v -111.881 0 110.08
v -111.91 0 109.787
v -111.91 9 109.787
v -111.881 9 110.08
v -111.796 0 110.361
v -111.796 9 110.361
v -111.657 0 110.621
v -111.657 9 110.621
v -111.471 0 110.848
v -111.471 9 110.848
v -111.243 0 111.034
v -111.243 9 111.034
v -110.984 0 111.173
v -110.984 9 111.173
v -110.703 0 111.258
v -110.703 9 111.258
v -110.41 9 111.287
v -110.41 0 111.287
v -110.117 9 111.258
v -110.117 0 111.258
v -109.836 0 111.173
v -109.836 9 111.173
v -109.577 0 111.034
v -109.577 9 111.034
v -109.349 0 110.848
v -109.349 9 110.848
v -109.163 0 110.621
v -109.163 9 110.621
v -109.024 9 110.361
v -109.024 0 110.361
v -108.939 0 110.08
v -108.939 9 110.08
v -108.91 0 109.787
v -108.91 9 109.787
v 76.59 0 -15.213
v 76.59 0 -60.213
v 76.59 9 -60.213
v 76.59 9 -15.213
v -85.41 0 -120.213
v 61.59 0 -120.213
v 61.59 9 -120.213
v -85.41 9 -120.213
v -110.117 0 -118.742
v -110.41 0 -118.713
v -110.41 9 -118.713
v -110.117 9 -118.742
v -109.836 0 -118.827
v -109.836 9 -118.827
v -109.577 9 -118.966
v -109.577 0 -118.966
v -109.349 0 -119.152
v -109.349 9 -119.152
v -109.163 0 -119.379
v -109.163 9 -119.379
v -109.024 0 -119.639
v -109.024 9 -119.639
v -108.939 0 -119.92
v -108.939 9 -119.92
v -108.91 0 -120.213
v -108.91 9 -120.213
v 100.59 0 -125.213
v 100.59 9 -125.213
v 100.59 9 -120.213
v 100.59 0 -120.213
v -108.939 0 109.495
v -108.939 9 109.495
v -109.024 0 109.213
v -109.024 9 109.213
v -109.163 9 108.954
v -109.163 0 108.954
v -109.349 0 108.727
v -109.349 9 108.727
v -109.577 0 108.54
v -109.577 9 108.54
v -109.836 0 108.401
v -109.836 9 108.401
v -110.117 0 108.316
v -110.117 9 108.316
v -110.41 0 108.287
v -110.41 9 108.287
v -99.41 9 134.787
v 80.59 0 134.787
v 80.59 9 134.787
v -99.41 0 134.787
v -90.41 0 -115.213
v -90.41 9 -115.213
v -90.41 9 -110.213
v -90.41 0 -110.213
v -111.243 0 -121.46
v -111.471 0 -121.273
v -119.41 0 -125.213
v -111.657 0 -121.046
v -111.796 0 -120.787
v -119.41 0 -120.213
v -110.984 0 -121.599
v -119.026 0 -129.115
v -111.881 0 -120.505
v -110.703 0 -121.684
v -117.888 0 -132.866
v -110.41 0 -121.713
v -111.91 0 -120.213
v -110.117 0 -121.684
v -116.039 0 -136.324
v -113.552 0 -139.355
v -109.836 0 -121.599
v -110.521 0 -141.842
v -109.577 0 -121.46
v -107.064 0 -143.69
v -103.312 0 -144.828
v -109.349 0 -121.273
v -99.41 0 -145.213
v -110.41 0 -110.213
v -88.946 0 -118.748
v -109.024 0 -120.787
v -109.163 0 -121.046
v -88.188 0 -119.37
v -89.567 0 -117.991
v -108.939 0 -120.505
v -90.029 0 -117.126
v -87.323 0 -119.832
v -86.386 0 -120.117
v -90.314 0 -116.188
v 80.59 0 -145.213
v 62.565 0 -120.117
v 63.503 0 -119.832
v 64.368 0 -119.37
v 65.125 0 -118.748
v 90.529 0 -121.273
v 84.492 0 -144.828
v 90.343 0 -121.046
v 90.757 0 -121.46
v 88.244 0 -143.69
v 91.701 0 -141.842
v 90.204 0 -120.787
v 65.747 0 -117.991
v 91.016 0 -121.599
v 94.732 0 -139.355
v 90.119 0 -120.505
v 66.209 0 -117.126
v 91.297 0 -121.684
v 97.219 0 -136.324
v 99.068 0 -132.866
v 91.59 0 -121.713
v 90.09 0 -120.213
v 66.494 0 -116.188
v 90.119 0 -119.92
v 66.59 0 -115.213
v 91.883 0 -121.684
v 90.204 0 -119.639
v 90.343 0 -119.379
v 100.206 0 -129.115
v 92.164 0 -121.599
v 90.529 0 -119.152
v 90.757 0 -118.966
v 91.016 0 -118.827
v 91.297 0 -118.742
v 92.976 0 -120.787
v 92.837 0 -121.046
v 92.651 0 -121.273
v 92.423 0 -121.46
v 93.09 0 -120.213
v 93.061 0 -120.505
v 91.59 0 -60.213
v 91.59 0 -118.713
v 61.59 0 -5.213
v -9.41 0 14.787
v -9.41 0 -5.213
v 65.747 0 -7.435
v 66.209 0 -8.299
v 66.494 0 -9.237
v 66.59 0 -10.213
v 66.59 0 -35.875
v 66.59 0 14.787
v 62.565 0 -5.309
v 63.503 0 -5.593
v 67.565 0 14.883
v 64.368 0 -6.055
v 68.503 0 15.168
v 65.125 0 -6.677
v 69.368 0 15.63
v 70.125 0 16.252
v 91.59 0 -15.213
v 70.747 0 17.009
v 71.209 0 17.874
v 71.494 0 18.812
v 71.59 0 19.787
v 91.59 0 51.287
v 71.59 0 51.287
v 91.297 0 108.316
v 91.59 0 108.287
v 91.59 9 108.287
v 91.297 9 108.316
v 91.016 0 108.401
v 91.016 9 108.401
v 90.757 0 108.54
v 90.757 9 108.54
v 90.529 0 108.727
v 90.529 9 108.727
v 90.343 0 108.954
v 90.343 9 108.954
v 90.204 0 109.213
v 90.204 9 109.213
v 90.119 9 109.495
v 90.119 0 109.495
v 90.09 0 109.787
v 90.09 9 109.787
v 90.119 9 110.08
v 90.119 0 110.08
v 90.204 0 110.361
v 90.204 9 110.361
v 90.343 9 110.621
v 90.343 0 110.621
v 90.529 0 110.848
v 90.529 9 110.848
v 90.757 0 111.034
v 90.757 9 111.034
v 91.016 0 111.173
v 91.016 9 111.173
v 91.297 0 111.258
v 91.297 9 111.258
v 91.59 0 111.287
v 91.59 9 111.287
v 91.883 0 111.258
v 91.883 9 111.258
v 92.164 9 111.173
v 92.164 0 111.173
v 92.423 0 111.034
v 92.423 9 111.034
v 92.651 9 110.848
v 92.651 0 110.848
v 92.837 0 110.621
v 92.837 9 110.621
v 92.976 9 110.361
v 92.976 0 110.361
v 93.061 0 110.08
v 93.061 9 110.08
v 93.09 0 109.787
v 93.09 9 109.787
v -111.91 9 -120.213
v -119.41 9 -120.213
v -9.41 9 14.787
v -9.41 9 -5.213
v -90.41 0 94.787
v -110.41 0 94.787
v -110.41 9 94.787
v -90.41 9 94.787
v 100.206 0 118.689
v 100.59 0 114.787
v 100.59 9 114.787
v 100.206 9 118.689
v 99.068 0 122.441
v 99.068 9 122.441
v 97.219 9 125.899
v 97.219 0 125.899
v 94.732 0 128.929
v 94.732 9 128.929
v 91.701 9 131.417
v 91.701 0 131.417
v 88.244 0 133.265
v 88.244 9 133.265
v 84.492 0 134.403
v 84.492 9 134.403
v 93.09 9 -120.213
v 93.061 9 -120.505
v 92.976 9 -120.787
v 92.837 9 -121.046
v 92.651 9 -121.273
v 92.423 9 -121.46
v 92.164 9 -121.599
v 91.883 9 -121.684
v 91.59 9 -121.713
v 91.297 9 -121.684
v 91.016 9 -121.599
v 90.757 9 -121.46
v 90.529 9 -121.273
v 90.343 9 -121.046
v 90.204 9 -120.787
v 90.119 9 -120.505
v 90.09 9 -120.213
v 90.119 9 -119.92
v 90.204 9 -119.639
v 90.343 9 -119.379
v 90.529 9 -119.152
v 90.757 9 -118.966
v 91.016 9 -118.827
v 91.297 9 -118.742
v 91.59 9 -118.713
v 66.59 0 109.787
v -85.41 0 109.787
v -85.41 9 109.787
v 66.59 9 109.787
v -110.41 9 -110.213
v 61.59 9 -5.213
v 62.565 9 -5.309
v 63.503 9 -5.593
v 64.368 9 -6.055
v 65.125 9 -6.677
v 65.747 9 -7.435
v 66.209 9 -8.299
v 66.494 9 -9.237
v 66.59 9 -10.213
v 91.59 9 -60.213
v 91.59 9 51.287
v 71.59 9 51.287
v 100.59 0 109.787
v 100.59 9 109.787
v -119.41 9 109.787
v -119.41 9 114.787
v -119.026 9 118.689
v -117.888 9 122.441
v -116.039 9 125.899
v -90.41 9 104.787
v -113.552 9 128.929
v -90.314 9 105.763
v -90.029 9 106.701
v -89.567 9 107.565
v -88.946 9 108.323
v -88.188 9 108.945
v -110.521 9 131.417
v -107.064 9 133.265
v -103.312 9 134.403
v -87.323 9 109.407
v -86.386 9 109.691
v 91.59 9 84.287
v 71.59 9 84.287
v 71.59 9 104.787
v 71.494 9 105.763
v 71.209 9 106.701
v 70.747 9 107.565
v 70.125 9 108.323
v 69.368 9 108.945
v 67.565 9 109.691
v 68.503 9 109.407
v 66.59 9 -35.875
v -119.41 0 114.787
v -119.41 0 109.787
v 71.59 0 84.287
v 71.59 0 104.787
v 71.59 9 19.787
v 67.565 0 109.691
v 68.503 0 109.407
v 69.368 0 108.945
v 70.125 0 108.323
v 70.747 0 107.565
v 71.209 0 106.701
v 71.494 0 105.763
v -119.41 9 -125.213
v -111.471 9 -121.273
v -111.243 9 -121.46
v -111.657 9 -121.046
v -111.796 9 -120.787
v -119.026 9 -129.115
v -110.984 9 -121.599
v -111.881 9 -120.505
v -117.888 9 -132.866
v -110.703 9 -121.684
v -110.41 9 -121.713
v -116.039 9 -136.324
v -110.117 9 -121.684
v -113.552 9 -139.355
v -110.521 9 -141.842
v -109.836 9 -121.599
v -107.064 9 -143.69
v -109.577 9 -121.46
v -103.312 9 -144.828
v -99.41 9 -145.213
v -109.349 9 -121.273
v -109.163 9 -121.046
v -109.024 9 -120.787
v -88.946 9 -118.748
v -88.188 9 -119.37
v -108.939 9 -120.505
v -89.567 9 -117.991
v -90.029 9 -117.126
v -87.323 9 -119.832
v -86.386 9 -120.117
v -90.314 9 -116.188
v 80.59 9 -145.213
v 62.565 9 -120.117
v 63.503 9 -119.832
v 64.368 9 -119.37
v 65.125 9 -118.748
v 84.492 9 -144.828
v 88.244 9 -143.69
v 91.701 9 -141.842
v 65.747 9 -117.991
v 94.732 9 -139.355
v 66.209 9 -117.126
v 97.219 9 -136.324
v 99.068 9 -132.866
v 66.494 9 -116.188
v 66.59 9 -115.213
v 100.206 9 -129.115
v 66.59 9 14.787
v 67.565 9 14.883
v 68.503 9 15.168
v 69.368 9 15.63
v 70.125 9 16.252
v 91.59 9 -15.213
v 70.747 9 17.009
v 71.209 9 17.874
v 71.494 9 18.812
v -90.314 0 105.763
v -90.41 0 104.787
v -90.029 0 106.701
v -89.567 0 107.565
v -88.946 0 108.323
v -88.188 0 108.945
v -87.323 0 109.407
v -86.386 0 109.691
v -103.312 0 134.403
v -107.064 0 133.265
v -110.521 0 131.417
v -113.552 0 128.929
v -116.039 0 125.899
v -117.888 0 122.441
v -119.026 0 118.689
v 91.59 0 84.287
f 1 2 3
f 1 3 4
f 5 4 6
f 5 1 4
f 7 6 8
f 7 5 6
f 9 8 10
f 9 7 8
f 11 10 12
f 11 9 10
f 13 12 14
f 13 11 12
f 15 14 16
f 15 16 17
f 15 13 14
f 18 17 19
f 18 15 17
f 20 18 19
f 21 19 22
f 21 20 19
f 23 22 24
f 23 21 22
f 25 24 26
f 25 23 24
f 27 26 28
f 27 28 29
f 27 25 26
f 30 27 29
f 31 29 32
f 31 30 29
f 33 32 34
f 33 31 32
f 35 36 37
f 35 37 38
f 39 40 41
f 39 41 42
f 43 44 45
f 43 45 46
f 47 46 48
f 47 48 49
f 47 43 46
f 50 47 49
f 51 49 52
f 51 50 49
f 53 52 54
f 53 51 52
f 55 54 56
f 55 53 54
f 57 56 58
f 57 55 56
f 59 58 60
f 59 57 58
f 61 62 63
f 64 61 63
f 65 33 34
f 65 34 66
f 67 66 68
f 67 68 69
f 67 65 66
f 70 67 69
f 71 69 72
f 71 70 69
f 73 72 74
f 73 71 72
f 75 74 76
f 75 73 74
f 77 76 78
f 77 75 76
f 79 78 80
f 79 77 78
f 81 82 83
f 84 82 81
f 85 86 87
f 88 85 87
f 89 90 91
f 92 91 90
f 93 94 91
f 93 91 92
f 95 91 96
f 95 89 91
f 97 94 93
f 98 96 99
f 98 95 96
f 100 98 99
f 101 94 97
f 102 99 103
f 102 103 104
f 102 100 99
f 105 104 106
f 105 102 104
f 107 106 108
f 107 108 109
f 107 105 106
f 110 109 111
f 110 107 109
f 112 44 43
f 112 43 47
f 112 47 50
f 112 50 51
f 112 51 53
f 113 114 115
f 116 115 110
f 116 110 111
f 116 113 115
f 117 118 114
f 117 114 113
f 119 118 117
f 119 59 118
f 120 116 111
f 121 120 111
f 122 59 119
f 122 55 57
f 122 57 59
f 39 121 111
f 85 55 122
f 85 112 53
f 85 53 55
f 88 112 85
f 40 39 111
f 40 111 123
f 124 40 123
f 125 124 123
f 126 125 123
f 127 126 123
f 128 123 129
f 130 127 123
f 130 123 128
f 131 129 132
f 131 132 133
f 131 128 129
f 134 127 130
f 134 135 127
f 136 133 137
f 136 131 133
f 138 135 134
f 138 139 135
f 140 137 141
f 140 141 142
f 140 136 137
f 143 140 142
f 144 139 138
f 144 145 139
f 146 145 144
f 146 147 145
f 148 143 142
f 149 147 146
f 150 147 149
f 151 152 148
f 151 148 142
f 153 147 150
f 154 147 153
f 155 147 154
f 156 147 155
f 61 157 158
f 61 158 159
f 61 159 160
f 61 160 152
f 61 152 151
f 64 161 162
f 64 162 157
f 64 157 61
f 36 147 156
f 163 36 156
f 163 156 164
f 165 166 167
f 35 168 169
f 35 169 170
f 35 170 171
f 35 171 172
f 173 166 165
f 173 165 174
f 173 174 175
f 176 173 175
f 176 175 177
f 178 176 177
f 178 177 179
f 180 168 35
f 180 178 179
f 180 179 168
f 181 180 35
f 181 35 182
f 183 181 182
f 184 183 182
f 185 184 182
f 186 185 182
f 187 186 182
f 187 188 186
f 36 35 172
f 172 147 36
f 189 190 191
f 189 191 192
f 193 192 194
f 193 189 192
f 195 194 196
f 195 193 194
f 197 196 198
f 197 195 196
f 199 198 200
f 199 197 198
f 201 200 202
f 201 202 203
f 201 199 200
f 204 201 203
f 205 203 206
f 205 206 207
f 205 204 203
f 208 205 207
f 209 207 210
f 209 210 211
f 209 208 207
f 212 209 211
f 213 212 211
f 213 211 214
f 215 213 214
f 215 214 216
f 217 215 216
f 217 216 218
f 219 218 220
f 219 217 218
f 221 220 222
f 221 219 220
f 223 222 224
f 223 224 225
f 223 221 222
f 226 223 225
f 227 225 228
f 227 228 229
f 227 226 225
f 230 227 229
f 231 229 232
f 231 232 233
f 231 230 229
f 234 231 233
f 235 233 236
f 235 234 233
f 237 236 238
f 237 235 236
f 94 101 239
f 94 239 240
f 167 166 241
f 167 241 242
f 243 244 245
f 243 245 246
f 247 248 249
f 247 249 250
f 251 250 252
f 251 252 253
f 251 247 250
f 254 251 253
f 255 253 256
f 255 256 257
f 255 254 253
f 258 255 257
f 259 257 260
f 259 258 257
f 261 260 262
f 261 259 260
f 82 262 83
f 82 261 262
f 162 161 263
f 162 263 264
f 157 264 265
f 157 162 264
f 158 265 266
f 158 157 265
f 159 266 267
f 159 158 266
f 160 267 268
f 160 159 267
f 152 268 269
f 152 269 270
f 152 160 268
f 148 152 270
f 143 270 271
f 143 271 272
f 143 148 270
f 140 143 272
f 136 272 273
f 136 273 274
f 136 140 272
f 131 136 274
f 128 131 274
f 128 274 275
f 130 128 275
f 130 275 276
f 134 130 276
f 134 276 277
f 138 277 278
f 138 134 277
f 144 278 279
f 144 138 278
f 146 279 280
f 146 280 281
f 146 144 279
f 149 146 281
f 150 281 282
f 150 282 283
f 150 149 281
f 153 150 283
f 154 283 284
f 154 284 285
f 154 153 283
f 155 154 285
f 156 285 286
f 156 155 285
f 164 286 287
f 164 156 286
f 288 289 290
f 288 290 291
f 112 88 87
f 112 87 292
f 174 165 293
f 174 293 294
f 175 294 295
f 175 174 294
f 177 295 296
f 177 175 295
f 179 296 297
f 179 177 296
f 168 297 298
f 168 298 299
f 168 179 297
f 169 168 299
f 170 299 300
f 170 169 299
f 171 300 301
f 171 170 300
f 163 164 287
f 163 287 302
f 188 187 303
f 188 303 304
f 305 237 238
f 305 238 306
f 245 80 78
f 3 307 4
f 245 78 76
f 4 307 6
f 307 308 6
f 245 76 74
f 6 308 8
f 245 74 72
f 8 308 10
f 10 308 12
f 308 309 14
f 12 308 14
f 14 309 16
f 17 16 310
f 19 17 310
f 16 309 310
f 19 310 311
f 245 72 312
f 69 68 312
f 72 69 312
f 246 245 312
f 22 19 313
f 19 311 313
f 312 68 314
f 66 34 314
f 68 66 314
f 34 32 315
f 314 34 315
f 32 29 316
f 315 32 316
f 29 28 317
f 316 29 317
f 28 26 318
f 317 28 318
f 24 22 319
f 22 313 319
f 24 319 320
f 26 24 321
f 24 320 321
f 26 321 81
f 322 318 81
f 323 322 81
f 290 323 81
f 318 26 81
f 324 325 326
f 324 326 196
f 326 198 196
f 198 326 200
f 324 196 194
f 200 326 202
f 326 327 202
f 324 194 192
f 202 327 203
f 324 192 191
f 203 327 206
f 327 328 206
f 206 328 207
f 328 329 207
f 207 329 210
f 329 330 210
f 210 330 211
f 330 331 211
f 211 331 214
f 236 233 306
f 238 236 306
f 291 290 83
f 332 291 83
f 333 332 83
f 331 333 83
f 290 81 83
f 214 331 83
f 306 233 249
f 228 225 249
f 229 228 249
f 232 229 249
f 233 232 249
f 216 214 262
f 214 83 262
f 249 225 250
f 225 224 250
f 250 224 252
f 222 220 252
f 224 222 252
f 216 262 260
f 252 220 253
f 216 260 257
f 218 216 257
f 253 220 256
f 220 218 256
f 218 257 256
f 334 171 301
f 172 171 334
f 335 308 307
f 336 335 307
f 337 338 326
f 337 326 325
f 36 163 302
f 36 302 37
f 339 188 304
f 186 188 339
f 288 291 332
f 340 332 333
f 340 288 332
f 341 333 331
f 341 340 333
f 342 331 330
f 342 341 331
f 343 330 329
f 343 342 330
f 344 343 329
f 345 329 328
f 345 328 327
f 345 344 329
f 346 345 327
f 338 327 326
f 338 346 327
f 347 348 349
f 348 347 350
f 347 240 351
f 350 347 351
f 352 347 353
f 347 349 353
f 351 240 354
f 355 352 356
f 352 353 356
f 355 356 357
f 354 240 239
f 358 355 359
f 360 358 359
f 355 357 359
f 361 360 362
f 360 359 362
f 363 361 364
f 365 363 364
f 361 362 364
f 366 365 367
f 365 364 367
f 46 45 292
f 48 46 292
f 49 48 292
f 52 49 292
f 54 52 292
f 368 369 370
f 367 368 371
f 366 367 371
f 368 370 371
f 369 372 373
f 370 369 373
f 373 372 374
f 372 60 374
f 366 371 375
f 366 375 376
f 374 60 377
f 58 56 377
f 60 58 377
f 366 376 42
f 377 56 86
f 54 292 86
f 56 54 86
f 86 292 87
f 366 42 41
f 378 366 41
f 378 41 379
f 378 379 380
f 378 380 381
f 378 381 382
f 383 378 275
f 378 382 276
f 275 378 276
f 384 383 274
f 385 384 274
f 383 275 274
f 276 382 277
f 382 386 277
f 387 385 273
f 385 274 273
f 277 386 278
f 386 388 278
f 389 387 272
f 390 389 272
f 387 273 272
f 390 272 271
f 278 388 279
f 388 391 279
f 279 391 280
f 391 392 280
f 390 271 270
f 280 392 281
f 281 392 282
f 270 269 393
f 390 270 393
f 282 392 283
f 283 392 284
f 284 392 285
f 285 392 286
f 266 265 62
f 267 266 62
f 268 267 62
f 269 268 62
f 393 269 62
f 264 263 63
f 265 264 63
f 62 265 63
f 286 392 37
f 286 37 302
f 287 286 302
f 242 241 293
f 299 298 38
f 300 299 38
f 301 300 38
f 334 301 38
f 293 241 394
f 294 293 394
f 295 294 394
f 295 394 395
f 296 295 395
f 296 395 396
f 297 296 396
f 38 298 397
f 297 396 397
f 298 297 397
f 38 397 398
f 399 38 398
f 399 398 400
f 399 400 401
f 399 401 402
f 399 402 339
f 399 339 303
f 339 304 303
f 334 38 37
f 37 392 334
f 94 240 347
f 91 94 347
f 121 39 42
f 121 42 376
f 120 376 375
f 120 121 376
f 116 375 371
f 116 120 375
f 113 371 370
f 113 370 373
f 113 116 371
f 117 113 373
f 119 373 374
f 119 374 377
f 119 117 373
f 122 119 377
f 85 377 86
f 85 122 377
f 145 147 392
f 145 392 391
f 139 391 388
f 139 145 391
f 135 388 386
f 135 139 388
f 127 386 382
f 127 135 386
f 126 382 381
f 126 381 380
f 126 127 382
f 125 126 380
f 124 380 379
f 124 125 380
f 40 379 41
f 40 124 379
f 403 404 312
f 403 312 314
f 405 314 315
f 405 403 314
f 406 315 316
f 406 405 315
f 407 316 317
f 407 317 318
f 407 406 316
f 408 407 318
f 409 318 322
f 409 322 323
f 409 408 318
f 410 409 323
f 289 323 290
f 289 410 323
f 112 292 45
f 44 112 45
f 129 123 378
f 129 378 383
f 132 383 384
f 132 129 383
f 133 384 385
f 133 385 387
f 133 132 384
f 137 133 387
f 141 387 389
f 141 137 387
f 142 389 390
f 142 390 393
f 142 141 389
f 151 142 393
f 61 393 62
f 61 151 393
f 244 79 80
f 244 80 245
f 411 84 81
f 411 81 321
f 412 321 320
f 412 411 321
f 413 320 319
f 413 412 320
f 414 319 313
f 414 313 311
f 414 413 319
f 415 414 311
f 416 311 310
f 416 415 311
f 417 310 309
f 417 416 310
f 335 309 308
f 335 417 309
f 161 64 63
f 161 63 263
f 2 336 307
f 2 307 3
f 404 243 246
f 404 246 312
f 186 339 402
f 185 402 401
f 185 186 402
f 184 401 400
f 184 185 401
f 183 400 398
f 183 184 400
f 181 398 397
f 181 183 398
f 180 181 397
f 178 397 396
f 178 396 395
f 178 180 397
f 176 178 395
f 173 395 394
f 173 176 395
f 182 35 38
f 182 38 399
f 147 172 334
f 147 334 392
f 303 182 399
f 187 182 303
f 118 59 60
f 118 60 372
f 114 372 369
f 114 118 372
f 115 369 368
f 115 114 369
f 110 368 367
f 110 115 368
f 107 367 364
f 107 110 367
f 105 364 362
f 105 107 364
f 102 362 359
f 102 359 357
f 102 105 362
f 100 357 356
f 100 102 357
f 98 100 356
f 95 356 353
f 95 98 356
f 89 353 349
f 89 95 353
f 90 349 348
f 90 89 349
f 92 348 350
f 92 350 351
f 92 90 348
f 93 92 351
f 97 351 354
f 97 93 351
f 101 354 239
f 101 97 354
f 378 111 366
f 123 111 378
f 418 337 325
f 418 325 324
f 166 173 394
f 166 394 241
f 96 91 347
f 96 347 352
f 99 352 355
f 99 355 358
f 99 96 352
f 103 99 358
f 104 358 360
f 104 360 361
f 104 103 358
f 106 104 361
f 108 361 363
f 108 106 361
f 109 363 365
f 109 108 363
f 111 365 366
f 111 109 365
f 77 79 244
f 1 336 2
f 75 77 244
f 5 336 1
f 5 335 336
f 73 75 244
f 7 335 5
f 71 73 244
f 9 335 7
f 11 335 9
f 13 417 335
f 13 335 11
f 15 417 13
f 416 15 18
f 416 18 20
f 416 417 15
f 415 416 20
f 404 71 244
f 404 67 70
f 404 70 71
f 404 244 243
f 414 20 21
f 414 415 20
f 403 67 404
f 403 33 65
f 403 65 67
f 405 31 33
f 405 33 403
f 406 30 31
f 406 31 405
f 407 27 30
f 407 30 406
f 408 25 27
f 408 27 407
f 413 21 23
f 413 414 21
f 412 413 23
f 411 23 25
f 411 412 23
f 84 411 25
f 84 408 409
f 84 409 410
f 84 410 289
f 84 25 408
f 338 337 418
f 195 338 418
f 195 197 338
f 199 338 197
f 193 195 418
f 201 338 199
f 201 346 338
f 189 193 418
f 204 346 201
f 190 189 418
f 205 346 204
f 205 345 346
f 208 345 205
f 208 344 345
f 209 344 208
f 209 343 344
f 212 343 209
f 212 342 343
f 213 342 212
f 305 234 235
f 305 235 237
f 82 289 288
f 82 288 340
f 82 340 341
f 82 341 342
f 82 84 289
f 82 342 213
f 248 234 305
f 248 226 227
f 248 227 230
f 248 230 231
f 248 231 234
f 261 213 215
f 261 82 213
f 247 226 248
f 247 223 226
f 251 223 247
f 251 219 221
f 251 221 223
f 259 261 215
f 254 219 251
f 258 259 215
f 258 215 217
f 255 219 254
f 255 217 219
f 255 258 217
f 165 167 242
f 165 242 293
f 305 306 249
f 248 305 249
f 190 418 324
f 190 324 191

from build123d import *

# Parameters (mm, degrees)
F1_DEPTH = 9


with BuildPart() as f1:
    # F0 (on Front) → F1 (new body)
    with BuildSketch(Plane.XZ):
        with BuildLine():
            Line((80.58994, 134.787209), (-99.41006, 134.787209))
            ThreePointArc((-99.41006, 134.787209), (-113.552195, 128.929344), (-119.41006, 114.787209))
            Line((-119.41006, 114.787209), (-119.41006, 109.787209))
            Line((-119.41006, 109.787209), (-111.91006, 109.787209))
            ThreePointArc((-111.91006, 109.787209), (-110.41006, 111.287209), (-108.91006, 109.787209))
            ThreePointArc((-108.91006, 109.787209), (-109.349399, 108.726549), (-110.41006, 108.287209))
            Line((-110.41006, 108.287209), (-110.41006, 94.787209))
            Line((-110.41006, 94.787209), (-90.41006, 94.787209))
            Line((-90.41006, 94.787209), (-90.41006, 104.787209))
            ThreePointArc((-90.41006, 104.787209), (-88.945593, 108.322743), (-85.41006, 109.787209))
            Line((-85.41006, 109.787209), (66.589941, 109.787209))
            ThreePointArc((66.589941, 109.787209), (70.125475, 108.322743), (71.589941, 104.787209))
            Line((71.589941, 104.787209), (71.589941, 84.287209))
            Line((71.589941, 84.287209), (91.58994, 84.287209))
            Line((91.58994, 84.287209), (91.58994, 108.287209))
            ThreePointArc((91.58994, 108.287209), (90.52928, 110.847869), (93.08994, 109.787209))
            Line((93.08994, 109.787209), (100.58994, 109.787209))
            Line((100.58994, 109.787209), (100.58994, 114.787209))
            ThreePointArc((100.58994, 114.787209), (94.732076, 128.929344), (80.58994, 134.787209))
        make_face()
        with BuildLine():
            ThreePointArc((-119.41006, -125.212791), (-113.552195, -139.354927), (-99.41006, -145.212791))
            Line((-99.41006, -145.212791), (80.58994, -145.212791))
            ThreePointArc((80.58994, -145.212791), (94.732076, -139.354927), (100.58994, -125.212791))
            Line((100.58994, -125.212791), (100.58994, -120.212791))
            Line((100.58994, -120.212791), (93.08994, -120.212791))
            ThreePointArc((93.08994, -120.212791), (90.52928, -121.273451), (91.58994, -118.712791))
            Line((91.58994, -118.712791), (91.58994, -110.212791))
            Line((91.58994, -110.212791), (91.58994, -60.212791))
            Line((91.58994, -60.212791), (76.58994, -60.212791))
            Line((76.58994, -60.212791), (76.58994, -15.212791))
            Line((76.58994, -15.212791), (91.58994, -15.212791))
            Line((91.58994, -15.212791), (91.58994, 51.287209))
            Line((91.58994, 51.287209), (71.589941, 51.287209))
            Line((71.589941, 51.287209), (71.589941, 19.787209))
            ThreePointArc((71.589941, 19.787209), (70.125475, 16.251675), (66.589941, 14.787209))
            Line((66.589941, 14.787209), (-9.410059, 14.787209))
            Line((-9.410059, 14.787209), (-9.41006, -5.212791))
            Line((-9.41006, -5.212791), (61.589941, -5.212791))
            ThreePointArc((61.589941, -5.212791), (65.125475, -6.677257), (66.589941, -10.212791))
            Line((66.589941, -10.212791), (66.58994, -35.874643))
            Line((66.58994, -35.874643), (66.589941, -115.212791))
            ThreePointArc((66.589941, -115.212791), (65.125475, -118.748325), (61.589941, -120.212791))
            Line((61.589941, -120.212791), (-85.41006, -120.212791))
            ThreePointArc((-85.41006, -120.212791), (-88.945593, -118.748325), (-90.41006, -115.212791))
            Line((-90.41006, -115.212791), (-90.41006, -110.212791))
            Line((-90.41006, -110.212791), (-110.41006, -110.212791))
            Line((-110.41006, -110.212791), (-110.41006, -118.712791))
            ThreePointArc((-110.41006, -118.712791), (-109.349399, -119.152131), (-108.91006, -120.212791))
            ThreePointArc((-108.91006, -120.212791), (-110.41006, -121.712791), (-111.91006, -120.212791))
            Line((-111.91006, -120.212791), (-119.41006, -120.212791))
            Line((-119.41006, -120.212791), (-119.41006, -125.212791))
        make_face()
    extrude(amount=-F1_DEPTH)


solid = f1.part
